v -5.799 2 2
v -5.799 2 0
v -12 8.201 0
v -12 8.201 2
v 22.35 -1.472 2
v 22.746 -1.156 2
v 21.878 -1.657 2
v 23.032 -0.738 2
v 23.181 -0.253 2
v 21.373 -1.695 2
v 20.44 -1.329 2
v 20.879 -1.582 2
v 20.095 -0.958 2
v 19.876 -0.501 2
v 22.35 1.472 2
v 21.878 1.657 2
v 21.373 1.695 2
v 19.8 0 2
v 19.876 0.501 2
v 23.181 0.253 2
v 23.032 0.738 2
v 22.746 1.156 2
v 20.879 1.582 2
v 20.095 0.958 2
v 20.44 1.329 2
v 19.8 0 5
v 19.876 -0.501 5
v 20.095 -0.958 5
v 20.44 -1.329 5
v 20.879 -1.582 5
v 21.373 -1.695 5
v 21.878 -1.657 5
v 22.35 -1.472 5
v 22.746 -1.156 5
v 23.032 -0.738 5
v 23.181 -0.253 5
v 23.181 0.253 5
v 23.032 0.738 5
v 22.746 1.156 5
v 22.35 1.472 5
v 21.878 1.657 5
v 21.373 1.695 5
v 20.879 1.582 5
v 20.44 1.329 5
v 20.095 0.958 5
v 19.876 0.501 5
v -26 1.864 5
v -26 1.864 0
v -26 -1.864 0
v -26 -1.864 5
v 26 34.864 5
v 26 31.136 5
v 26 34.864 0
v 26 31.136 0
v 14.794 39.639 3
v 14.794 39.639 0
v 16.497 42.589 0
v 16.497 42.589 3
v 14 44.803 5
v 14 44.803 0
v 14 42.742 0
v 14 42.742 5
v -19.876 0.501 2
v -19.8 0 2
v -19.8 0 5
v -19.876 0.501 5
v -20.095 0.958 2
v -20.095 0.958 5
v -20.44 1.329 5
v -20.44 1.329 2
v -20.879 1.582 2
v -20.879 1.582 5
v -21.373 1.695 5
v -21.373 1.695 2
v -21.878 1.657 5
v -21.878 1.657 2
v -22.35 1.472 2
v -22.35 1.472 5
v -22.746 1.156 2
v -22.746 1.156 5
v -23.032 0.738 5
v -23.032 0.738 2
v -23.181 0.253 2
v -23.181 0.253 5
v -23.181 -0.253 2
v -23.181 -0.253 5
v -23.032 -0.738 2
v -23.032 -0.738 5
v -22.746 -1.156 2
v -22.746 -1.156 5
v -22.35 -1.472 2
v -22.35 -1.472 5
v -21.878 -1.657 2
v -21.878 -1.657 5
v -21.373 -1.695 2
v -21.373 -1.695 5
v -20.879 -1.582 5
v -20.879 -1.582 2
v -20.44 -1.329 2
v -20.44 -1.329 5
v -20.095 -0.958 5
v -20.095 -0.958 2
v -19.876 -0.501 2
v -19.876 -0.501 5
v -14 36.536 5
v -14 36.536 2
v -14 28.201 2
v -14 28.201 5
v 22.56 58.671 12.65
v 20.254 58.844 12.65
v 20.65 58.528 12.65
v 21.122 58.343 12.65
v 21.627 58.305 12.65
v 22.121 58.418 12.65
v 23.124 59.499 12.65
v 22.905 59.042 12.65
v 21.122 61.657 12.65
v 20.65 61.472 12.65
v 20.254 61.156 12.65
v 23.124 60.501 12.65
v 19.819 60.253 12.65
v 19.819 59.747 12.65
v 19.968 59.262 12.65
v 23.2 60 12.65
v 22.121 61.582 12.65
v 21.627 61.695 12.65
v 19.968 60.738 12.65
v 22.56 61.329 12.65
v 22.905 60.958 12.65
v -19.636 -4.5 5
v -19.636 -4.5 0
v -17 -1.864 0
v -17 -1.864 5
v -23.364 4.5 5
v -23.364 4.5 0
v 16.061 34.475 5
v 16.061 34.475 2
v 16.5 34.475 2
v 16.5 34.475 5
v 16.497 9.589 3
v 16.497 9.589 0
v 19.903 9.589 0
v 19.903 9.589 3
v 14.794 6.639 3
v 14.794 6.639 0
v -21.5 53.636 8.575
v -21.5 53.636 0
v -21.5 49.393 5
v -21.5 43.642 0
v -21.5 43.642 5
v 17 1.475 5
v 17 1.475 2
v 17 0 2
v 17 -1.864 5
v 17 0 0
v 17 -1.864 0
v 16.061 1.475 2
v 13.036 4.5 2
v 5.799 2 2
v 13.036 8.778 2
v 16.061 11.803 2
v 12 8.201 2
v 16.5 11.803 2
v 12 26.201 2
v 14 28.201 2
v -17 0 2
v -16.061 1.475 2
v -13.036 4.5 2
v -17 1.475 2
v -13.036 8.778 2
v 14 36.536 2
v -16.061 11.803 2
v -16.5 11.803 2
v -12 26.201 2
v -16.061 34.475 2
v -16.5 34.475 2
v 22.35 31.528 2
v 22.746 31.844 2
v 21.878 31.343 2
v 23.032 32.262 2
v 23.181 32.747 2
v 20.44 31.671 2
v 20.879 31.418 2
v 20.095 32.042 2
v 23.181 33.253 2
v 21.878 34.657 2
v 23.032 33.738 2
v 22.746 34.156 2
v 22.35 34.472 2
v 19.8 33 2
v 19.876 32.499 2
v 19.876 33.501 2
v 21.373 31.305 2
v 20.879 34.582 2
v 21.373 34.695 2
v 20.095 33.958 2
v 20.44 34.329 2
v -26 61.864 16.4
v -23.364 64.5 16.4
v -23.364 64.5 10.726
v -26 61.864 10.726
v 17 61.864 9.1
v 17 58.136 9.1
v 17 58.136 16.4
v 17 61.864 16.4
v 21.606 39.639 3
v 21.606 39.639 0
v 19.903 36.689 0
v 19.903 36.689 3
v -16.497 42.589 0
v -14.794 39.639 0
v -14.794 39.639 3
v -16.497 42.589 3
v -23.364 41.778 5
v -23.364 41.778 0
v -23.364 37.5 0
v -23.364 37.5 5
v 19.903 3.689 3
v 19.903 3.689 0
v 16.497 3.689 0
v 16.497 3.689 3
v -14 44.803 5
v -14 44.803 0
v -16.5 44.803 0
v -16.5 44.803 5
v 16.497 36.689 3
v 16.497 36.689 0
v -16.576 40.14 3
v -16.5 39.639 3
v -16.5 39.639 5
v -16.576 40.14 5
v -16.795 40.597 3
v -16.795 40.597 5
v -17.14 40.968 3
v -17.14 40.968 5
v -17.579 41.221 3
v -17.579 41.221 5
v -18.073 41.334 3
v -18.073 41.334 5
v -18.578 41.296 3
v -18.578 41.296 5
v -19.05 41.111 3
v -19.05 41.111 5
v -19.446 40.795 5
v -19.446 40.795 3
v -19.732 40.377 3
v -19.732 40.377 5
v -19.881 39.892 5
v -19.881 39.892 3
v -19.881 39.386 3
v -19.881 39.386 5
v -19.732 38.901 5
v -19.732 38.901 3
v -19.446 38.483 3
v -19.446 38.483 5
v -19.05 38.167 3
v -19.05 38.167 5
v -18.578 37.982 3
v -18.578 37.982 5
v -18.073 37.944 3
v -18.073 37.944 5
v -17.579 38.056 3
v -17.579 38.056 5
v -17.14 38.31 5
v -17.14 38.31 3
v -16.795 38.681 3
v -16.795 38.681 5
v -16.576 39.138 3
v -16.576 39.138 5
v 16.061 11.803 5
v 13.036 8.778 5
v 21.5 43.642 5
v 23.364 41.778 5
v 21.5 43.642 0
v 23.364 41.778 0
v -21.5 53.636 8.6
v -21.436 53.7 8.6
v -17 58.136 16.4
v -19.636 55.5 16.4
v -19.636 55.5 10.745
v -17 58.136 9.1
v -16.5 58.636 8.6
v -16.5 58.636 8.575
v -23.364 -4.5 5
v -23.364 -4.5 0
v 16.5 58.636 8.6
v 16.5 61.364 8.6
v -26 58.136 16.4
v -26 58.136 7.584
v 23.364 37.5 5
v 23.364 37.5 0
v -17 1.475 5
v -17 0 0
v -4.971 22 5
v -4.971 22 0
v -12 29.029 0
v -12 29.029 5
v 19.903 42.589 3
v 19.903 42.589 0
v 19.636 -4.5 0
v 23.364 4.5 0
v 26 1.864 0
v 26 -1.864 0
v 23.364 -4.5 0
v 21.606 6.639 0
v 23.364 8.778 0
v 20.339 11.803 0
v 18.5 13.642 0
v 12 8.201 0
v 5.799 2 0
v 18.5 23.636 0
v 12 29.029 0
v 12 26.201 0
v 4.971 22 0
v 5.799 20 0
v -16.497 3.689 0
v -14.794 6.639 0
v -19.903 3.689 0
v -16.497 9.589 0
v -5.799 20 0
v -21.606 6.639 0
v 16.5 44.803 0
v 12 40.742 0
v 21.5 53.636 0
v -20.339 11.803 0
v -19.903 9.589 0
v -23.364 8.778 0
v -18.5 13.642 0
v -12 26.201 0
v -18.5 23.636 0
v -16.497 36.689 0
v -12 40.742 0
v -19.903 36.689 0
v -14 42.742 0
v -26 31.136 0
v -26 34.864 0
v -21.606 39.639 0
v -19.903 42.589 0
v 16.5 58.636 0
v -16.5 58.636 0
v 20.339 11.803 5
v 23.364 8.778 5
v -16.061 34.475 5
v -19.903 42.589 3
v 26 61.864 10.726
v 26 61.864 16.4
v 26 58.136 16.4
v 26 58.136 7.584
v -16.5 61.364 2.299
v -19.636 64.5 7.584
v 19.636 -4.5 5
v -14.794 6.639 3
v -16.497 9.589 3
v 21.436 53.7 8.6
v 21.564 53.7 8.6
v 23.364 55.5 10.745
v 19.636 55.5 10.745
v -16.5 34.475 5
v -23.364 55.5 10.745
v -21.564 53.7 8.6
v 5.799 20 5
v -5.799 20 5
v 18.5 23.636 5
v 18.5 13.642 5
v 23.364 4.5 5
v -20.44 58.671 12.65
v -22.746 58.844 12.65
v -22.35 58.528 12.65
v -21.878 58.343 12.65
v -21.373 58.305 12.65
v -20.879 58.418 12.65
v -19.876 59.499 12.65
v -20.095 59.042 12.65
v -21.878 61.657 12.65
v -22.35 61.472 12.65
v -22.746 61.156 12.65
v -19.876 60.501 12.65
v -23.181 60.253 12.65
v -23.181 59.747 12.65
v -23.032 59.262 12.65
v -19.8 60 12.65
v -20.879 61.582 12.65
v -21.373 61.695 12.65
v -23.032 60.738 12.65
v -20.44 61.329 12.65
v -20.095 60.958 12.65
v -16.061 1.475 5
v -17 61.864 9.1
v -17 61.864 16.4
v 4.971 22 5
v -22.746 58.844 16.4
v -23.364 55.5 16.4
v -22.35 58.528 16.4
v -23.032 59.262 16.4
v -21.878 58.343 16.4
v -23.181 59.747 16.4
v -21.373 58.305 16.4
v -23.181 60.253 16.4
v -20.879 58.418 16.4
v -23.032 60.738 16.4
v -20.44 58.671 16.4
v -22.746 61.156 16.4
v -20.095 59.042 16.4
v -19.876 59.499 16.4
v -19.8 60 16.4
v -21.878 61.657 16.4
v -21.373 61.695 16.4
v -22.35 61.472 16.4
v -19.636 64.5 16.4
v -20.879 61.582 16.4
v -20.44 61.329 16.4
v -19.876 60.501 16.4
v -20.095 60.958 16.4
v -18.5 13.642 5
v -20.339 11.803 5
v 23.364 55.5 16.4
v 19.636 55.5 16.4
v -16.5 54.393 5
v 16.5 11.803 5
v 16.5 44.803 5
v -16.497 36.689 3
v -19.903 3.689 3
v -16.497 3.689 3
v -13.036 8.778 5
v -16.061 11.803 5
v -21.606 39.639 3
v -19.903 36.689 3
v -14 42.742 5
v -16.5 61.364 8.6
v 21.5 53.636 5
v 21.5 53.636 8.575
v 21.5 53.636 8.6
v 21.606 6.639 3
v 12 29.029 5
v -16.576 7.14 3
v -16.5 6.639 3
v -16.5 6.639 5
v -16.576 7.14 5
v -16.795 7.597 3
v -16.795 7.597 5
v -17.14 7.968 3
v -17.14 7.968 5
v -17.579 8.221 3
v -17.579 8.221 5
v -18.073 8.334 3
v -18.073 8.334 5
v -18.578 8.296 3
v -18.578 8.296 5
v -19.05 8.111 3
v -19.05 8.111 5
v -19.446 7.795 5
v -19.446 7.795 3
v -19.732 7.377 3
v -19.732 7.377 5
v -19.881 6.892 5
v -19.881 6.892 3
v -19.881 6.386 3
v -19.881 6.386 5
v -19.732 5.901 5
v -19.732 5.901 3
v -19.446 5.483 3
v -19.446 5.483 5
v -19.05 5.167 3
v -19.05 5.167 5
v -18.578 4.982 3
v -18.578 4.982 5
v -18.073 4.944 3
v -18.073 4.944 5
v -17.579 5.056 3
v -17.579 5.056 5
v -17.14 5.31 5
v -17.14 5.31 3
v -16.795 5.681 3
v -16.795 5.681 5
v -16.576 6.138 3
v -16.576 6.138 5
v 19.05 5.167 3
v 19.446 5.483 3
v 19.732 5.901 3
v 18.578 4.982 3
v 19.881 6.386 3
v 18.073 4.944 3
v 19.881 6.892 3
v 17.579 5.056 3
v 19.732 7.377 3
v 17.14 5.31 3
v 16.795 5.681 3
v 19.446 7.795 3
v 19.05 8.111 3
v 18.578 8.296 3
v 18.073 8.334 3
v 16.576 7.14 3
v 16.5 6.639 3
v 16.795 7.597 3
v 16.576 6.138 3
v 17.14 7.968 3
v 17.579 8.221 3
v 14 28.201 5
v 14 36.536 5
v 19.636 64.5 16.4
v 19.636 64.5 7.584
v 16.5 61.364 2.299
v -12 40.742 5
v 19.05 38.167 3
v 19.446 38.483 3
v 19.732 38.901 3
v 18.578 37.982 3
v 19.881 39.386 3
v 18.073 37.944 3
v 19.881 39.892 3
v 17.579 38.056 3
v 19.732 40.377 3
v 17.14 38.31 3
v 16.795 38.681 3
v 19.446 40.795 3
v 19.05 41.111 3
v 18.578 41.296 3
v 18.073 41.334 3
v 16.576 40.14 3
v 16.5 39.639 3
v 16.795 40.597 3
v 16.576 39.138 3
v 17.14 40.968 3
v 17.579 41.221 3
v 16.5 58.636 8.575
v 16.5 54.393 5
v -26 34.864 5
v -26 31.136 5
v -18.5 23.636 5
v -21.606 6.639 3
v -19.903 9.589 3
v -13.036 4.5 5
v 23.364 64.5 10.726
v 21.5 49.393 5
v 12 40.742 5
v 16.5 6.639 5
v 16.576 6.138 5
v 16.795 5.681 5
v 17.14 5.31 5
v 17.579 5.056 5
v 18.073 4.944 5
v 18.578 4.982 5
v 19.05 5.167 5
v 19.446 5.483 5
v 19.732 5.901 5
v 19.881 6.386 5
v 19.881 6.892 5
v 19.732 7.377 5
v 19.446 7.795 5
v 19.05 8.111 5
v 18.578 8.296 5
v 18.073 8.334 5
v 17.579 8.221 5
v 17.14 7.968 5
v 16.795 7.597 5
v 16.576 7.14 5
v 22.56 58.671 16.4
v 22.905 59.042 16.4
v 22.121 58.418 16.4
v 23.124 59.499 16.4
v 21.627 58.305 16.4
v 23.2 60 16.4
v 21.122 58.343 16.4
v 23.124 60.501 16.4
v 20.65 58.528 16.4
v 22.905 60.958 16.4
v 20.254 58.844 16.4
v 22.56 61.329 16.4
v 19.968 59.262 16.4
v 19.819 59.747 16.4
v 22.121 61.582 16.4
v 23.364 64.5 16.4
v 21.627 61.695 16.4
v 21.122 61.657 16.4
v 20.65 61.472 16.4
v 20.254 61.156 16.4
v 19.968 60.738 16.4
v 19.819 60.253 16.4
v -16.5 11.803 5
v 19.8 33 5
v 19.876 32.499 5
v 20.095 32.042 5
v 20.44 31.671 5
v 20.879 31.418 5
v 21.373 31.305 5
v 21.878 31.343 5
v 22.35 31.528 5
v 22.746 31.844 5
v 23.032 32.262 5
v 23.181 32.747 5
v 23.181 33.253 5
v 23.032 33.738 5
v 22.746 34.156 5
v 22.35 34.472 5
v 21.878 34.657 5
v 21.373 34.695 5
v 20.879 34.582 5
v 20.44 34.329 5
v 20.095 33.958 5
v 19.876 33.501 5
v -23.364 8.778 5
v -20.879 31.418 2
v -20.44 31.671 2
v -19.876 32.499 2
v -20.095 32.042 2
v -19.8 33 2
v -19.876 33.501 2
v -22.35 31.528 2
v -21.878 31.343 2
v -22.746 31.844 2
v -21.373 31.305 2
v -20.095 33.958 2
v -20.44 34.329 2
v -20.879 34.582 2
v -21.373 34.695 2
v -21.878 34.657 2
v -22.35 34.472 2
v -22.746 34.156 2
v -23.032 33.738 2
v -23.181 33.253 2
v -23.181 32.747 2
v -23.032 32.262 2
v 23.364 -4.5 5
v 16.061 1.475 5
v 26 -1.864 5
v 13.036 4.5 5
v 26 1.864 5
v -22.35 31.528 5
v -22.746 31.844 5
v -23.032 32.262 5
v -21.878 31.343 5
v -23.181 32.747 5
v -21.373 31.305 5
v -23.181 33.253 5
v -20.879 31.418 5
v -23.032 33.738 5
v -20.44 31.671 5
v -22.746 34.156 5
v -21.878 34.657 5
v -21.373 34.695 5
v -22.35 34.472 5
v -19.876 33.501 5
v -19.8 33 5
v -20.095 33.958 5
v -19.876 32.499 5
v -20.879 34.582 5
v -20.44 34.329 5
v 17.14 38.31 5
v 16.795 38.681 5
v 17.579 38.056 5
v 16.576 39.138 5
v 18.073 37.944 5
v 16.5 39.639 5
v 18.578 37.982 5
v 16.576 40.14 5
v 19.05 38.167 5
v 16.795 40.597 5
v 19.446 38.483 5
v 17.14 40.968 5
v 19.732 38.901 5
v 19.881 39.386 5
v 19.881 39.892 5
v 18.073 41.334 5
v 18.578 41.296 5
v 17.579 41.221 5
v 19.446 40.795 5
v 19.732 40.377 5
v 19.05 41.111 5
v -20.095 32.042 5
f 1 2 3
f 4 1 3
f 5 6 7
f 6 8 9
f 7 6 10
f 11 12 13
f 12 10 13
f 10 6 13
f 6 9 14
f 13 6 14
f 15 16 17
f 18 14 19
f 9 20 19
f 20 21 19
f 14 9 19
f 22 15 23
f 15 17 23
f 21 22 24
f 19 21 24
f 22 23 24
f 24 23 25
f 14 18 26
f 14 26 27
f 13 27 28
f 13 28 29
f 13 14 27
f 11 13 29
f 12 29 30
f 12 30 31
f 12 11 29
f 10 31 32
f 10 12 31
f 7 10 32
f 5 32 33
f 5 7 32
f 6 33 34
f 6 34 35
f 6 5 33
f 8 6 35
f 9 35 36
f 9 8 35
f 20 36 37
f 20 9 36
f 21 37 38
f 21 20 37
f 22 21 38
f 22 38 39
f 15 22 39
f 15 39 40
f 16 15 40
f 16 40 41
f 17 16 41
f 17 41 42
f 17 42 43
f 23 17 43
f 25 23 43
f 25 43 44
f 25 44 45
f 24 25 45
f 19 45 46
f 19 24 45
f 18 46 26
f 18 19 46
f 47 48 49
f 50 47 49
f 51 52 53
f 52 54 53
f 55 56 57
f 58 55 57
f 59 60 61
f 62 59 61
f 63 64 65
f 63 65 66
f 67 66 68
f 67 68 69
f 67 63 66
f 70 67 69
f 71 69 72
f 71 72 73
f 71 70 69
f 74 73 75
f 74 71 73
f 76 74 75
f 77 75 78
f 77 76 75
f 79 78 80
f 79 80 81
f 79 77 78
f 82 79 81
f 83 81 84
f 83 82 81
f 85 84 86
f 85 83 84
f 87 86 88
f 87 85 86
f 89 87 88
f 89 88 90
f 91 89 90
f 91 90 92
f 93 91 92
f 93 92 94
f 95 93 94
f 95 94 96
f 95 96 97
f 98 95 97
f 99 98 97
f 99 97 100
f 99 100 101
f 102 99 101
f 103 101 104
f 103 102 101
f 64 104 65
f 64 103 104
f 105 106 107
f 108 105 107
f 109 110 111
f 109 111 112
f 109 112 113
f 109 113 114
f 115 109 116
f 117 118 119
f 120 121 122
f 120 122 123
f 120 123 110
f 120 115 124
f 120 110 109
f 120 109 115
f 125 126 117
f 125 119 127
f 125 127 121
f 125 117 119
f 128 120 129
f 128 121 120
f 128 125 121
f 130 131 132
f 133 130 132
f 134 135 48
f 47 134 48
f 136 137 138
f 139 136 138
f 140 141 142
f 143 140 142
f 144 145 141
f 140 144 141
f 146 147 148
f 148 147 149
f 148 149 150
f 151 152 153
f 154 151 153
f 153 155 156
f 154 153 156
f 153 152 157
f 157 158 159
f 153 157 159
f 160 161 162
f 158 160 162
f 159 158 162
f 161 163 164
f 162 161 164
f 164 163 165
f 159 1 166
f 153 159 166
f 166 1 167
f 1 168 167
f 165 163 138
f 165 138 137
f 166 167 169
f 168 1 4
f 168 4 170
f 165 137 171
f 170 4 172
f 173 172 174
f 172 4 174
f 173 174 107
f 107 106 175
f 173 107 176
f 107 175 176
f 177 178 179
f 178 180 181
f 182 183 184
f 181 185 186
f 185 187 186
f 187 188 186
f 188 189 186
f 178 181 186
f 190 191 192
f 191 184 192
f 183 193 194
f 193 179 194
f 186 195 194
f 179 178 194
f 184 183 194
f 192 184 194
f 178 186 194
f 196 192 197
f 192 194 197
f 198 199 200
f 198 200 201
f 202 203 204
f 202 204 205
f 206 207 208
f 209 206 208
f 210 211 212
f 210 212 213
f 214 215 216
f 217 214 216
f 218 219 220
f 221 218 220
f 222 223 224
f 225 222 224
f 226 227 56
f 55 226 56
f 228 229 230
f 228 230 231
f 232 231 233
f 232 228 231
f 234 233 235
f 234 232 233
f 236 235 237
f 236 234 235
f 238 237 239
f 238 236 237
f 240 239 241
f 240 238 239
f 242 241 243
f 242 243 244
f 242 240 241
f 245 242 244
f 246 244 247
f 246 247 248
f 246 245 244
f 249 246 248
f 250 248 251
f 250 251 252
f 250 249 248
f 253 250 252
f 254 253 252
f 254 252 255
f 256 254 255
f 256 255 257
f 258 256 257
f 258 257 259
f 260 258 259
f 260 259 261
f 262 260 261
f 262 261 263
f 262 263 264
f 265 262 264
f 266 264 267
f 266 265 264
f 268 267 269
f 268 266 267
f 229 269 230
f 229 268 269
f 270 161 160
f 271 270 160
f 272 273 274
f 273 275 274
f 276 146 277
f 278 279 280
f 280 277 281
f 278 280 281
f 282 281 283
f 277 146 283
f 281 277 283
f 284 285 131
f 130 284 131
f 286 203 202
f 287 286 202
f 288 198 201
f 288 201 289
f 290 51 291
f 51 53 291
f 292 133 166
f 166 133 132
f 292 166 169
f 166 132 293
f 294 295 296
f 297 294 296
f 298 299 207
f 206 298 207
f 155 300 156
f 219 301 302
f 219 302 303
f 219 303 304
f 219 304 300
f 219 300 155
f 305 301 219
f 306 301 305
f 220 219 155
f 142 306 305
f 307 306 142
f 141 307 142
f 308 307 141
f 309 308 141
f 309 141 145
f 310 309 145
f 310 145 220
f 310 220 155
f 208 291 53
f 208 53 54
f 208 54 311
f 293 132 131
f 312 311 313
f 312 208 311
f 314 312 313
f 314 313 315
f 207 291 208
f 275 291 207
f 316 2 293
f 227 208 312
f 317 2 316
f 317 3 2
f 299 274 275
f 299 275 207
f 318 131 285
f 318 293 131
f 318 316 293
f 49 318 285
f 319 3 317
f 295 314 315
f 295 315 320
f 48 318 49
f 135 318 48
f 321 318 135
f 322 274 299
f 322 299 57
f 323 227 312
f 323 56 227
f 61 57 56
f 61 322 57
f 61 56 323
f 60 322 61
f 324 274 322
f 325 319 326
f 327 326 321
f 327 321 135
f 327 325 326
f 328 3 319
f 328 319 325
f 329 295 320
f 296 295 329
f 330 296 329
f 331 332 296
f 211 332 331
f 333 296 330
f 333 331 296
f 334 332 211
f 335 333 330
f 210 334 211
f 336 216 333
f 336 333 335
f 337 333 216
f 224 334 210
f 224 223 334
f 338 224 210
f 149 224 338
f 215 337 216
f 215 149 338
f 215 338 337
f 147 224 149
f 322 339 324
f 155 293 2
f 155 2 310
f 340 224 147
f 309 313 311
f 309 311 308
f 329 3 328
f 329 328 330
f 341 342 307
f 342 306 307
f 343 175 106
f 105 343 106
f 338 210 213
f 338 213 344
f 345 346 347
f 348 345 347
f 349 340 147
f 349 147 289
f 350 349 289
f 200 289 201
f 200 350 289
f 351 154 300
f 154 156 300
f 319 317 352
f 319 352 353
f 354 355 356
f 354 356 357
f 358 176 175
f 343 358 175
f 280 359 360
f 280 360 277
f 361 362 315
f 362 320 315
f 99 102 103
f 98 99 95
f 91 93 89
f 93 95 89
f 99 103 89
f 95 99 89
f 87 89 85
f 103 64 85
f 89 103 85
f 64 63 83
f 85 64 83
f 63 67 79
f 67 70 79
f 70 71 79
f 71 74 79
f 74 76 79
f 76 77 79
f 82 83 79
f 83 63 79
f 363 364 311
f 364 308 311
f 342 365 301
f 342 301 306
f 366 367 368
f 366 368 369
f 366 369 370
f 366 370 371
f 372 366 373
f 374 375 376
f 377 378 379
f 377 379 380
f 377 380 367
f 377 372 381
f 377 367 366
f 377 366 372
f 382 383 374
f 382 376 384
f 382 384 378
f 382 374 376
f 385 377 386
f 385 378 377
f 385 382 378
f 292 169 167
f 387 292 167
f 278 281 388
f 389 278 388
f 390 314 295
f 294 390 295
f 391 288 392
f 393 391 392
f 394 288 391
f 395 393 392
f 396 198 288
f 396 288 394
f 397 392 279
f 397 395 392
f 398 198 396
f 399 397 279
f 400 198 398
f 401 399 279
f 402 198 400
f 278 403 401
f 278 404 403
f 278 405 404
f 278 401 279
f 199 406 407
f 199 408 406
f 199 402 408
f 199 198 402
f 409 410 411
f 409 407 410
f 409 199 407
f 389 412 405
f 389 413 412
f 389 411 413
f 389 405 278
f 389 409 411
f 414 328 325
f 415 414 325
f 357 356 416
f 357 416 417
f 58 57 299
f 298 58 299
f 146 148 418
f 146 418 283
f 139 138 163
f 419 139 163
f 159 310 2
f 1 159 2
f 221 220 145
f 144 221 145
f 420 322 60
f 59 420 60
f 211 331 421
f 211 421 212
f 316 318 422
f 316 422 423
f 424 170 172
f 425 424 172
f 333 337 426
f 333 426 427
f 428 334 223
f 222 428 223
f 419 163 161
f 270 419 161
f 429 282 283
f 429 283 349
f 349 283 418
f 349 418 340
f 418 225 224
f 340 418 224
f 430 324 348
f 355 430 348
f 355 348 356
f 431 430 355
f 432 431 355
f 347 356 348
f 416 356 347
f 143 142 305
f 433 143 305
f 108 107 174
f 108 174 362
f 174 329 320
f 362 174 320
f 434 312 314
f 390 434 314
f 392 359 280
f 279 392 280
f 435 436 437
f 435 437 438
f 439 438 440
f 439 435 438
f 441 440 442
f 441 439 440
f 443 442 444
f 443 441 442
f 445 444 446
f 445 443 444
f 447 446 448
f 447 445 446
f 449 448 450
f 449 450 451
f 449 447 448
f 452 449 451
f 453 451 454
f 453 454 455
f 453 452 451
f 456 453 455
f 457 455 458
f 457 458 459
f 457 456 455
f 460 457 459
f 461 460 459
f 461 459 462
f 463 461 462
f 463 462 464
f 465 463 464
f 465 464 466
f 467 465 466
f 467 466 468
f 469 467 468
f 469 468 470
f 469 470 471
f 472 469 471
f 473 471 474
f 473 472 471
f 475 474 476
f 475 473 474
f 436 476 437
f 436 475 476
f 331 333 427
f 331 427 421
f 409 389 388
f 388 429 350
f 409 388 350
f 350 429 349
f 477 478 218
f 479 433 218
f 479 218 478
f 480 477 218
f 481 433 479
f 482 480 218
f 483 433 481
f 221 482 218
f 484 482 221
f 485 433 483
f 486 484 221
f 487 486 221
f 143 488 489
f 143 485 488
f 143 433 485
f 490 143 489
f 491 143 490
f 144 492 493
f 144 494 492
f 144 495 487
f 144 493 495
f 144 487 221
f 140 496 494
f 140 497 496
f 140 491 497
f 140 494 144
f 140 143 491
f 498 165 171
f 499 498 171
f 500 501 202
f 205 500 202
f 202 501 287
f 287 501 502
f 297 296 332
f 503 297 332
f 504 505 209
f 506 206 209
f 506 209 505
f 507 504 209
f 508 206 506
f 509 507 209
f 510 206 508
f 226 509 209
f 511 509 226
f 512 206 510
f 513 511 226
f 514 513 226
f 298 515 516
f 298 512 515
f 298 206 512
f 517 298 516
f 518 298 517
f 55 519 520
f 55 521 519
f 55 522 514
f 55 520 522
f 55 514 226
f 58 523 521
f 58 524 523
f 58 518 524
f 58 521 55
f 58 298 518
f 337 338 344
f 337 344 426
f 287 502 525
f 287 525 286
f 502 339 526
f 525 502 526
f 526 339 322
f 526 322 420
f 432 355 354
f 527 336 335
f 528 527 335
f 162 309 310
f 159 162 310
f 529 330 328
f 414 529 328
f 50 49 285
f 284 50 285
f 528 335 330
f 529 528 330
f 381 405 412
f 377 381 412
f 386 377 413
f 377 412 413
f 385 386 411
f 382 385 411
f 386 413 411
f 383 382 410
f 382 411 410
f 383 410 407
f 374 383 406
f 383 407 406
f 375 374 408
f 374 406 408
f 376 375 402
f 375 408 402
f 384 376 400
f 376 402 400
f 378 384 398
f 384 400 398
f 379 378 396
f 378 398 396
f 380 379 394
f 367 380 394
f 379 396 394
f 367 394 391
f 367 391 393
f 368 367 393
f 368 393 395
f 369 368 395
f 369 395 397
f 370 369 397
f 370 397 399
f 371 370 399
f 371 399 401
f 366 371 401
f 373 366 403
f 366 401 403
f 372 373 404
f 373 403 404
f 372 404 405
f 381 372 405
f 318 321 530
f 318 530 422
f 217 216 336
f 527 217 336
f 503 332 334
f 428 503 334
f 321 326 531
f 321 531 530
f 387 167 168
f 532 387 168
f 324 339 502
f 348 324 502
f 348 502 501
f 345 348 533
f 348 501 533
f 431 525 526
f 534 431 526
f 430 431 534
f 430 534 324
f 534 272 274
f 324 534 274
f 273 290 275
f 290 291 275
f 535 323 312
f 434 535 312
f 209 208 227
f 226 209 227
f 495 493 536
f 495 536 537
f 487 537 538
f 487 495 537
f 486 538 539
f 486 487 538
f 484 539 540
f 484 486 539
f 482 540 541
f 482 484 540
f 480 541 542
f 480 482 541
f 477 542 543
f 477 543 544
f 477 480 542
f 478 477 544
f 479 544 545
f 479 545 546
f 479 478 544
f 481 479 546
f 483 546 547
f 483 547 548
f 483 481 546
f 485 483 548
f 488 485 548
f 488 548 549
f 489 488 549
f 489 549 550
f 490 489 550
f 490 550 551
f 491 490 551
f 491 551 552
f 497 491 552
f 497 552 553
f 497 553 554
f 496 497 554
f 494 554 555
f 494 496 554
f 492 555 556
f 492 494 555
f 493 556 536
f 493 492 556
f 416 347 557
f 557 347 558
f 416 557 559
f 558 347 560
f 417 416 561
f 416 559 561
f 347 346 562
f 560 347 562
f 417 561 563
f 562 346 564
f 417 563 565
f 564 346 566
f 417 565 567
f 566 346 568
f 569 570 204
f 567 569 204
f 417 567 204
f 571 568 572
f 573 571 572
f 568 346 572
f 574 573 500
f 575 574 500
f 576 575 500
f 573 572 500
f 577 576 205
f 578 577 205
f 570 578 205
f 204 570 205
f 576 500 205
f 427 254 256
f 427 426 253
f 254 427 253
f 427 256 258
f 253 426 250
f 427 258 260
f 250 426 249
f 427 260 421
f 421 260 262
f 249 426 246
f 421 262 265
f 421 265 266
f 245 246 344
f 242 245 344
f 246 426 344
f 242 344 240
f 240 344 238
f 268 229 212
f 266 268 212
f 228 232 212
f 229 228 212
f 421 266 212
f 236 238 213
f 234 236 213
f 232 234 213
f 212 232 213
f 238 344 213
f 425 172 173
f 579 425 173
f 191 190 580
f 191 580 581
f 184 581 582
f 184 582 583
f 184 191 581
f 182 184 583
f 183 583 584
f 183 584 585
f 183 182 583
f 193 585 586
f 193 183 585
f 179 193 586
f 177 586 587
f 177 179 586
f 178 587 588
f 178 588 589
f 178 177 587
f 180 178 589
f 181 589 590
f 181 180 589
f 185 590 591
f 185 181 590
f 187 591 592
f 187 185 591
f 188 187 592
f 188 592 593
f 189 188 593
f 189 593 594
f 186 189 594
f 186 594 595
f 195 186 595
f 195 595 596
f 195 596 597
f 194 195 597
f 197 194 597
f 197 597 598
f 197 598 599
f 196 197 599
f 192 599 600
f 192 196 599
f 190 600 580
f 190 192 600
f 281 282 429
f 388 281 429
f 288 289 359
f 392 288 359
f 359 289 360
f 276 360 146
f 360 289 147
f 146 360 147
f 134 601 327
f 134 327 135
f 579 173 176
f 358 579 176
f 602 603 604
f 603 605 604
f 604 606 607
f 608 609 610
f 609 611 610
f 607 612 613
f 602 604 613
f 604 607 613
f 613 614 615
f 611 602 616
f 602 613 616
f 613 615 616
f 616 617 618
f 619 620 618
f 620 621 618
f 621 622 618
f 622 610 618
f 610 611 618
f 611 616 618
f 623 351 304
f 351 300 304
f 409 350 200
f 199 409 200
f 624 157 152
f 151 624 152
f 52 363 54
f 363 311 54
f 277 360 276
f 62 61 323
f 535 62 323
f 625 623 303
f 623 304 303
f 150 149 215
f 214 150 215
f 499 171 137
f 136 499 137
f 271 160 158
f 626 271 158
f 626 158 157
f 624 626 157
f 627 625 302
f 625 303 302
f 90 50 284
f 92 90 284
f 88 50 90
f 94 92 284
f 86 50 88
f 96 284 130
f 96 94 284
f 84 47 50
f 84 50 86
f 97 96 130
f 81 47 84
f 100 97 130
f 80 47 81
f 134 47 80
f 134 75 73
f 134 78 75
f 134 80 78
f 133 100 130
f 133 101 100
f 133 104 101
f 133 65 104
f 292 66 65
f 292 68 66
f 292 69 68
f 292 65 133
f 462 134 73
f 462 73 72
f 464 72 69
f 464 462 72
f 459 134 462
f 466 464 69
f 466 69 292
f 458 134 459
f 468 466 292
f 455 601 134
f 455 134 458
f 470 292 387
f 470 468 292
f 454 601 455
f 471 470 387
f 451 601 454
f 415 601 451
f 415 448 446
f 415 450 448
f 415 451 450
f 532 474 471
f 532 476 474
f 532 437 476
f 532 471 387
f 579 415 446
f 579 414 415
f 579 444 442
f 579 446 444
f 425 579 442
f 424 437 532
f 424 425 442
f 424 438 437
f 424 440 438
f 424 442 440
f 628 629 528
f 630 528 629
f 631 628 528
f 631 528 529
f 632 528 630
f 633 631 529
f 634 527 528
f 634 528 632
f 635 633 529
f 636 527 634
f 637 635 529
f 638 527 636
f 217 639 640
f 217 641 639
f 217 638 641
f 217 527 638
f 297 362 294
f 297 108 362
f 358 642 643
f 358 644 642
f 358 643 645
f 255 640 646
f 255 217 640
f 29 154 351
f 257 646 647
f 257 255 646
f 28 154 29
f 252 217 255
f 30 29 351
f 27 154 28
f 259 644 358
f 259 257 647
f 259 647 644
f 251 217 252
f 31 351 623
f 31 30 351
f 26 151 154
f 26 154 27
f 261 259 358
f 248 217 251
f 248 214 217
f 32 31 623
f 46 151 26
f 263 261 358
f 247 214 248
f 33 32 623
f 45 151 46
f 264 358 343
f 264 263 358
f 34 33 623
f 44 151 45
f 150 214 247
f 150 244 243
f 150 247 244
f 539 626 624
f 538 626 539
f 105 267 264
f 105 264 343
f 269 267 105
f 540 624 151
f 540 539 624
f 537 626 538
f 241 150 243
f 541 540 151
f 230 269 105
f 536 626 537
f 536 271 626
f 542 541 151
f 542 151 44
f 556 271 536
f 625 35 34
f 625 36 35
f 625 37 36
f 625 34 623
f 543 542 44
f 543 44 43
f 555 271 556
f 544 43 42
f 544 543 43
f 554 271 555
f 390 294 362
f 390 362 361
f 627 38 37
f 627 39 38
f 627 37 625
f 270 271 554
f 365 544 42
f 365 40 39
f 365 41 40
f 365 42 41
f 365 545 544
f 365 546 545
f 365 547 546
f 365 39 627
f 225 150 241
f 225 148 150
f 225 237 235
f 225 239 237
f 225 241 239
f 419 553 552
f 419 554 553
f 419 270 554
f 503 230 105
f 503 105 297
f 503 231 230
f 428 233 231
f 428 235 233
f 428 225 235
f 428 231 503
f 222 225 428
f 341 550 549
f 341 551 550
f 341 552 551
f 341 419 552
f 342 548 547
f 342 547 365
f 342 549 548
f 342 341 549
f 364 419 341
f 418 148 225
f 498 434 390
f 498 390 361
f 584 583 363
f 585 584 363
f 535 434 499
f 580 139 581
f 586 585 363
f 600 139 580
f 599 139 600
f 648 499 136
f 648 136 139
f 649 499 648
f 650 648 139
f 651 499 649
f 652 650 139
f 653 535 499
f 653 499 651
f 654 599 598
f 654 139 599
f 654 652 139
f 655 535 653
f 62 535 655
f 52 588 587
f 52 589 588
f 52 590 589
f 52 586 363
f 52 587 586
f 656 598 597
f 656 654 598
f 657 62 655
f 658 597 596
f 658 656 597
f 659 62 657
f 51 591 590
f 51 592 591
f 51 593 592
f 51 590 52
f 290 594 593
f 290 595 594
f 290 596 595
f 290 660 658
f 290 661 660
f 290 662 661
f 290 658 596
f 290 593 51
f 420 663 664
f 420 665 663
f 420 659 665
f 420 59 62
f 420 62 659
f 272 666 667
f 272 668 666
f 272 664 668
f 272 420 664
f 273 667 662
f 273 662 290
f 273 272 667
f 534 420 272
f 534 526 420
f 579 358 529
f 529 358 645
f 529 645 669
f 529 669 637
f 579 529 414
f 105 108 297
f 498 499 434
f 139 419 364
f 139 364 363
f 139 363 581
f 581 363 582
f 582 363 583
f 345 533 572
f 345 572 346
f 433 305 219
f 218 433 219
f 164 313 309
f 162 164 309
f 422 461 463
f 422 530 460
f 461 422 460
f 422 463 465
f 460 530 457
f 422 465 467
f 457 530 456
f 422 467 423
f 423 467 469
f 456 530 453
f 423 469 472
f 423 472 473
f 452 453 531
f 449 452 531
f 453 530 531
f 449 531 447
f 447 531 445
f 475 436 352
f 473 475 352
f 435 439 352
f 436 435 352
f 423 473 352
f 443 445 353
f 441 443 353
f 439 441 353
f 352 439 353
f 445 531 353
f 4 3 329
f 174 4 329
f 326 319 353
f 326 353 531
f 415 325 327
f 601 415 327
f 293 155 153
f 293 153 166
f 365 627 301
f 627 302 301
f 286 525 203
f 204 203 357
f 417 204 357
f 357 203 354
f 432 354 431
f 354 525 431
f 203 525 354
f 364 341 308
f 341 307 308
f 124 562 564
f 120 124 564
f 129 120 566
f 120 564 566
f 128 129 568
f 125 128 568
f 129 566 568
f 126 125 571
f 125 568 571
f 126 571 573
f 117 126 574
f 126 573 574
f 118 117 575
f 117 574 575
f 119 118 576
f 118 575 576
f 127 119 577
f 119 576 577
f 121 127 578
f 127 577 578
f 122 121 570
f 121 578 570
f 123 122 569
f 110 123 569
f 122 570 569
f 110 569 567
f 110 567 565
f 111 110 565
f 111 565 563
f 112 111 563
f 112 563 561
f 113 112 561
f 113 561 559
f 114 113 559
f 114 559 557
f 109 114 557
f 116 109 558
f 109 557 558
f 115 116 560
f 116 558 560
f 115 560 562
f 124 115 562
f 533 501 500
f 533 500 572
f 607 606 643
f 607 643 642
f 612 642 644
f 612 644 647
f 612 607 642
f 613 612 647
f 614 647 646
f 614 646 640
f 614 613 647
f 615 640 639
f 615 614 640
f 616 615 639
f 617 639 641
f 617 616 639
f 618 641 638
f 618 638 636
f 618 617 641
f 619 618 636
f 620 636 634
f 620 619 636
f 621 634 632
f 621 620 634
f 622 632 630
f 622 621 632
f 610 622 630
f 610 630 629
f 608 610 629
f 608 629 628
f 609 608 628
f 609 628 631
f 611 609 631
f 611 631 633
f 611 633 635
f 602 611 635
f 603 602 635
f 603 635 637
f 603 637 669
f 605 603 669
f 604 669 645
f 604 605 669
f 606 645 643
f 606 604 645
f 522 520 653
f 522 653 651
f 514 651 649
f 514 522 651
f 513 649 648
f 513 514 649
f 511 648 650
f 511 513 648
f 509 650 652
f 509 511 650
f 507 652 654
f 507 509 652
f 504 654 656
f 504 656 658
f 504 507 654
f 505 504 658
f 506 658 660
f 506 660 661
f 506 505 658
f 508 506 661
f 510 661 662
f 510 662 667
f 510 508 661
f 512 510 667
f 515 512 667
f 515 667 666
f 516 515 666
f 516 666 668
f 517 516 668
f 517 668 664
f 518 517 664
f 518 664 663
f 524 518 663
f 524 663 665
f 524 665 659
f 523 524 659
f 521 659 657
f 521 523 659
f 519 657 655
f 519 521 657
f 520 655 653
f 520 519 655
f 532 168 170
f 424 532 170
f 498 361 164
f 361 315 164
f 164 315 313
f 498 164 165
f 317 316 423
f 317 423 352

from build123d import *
from OCP.BRepFilletAPI import BRepFilletAPI_MakeChamfer

# Parameters (mm, degrees)
SKETCH5_R           = 1.7
BOSS_EXTRUDE1_DEPTH = 2
SKETCH9_R           = 1.7
BOSS_EXTRUDE3_DEPTH = 3
BOSS_EXTRUDE4_DEPTH = 3.6
BOSS_EXTRUDE5_DEPTH = 7.8
TOP_ANGLE_1_DEPTH   = 25
TOP_ANGLE_2_DEPTH   = 25
CHAMFER1_SIZE       = 3
CHAMFER1_SIZE_2     = 3.575260778
CHAMFER2_SIZE       = 1.8
CHAMFER2_SIZE2      = 2.145156467
SKETCH19_R          = 1.7
CUT_EXTRUDE1_DEPTH  = 3.75
M3_HEAD_HOLES_DEPTH = 3
CHAMFER3_SIZE       = 0.5


# Some blends are built 0.0001 mm under size
with BuildPart() as part:
    # Sketch5 → Boss-Extrude1 (new body)
    with BuildSketch(Plane.XY):
        Polygon((16.5, 44.802943725), (16.5, 45.24192642), (16.5, 61.363961031), (17, 61.863961031), (19.636038969, 64.5), (23.363961031, 64.5), (26, 61.863961031), (26, 58.136038969), (23.363961031, 55.5), (21.5, 53.636038969), (21.5, 43.64192642), (23.363961031, 41.777965389), (23.363961031, 37.5), (26, 34.863961031), (26, 31.136038969), (23.363961031, 28.5), (18.5, 23.636038969), (18.5, 13.64192642), (20.338982694, 11.802943725), (23.363961031, 8.777965389), (23.363961031, 4.5), (26, 1.863961031), (26, -1.863961031), (23.363961031, -4.5), (19.636038969, -4.5), (17, -1.863961031), (17, 0), (-17, 0), (-17, -1.863961031), (-19.636038969, -4.5), (-23.363961031, -4.5), (-26, -1.863961031), (-26, 1.863961031), (-23.363961031, 4.5), (-23.363961031, 8.777965389), (-20.338982694, 11.802943725), (-18.5, 13.64192642), (-18.5, 23.636038969), (-23.363961031, 28.5), (-26, 31.136038969), (-26, 34.863961031), (-23.363961031, 37.5), (-23.363961031, 41.777965389), (-21.5, 43.64192642), (-21.5, 53.636038969), (-23.363961031, 55.5), (-26, 58.136038969), (-26, 61.863961031), (-23.363961031, 64.5), (-19.636038969, 64.5), (-17, 61.863961031), (-16.5, 61.363961031), (-16.5, 60), (-16.5, 44.802943725), (-16.061017306, 44.802943725), (-14, 44.802943725), (-14, 42.74192642), (-13.036038969, 41.777965389), (-12, 40.74192642), (-12, 29.029437252), (-4.970562748, 22), (4.970562748, 22), (12, 29.029437252), (12, 40.74192642), (13.036038969, 41.777965389), (14, 42.74192642), (14, 44.802943725), (16.061017306, 44.802943725), align=None)
        with Locations((-18.2, 6.638982694)):
            Circle(SKETCH5_R, mode=Mode.SUBTRACT)
        with Locations((-18.2, 39.638982694)):
            Circle(SKETCH5_R, mode=Mode.SUBTRACT)
        with Locations(Location((18.2, 39.638982694, 0), (0, 0, 180))):
            Circle(SKETCH5_R, mode=Mode.SUBTRACT)
        with Locations(Location((18.2, 6.638982694, 0), (0, 0, 180))):
            Circle(SKETCH5_R, mode=Mode.SUBTRACT)
        Polygon((5.798989873, 2), (-5.798989873, 2), (-12, 8.201010127), (-12, 26.201010127), (-5.798989873, 20), (5.798989873, 20), (12, 26.201010127), (12, 8.201010127), align=None, mode=Mode.SUBTRACT)
    extrude(amount=BOSS_EXTRUDE1_DEPTH)

    # Sketch9 → Boss-Extrude3 (add)
    with BuildSketch(Plane.XY.offset(2)):
        Polygon((-19.636038969, -4.5), (-17, -1.863961031), (-17, 1.475021664), (-16.061017306, 1.475021664), (-13.036038969, 4.5), (-13.036038969, 8.777965389), (-16.061017306, 11.802943725), (-16.5, 11.802943725), (-16.5, 34.363961031), (-16.5, 34.475021664), (-16.061017306, 34.475021664), (-14, 36.536038969), (-14, 28.201010127), (-12, 26.201010127), (-5.798989873, 20), (5.798989873, 20), (12, 26.201010127), (14, 28.201010127), (14, 36.536038969), (16.061017306, 34.475021664), (16.5, 34.475021664), (16.5, 34.363961031), (16.5, 11.802943725), (16.061017306, 11.802943725), (13.036038969, 8.777965389), (13.036038969, 4.5), (16.061017306, 1.475021664), (17, 1.475021664), (17, -1.863961031), (19.636038969, -4.5), (23.363961031, -4.5), (26, -1.863961031), (26, 1.863961031), (23.363961031, 4.5), (23.363961031, 8.777965389), (20.338982694, 11.802943725), (18.5, 13.64192642), (18.5, 23.636038969), (23.363961031, 28.5), (26, 31.136038969), (26, 34.863961031), (23.363961031, 37.5), (23.363961031, 41.777965389), (21.5, 43.64192642), (21.5, 53.636038969), (23.363961031, 55.5), (26, 58.136038969), (26, 61.863961031), (23.363961031, 64.5), (19.636038969, 64.5), (17, 61.863961031), (16.5, 61.363961031), (16.5, 45.24192642), (16.5, 44.802943725), (16.061017306, 44.802943725), (14, 44.802943725), (14, 42.74192642), (13.036038969, 41.777965389), (12, 40.74192642), (12, 29.029437252), (4.970562748, 22), (-4.970562748, 22), (-12, 29.029437252), (-12, 40.74192642), (-13.036038969, 41.777965389), (-14, 42.74192642), (-14, 44.802943725), (-16.061017306, 44.802943725), (-16.5, 44.802943725), (-16.5, 60), (-16.5, 61.363961031), (-17, 61.863961031), (-19.636038969, 64.5), (-23.363961031, 64.5), (-26, 61.863961031), (-26, 58.136038969), (-23.363961031, 55.5), (-21.5, 53.636038969), (-21.5, 43.64192642), (-23.363961031, 41.777965389), (-23.363961031, 37.5), (-26, 34.863961031), (-26, 31.136038969), (-23.363961031, 28.5), (-18.5, 23.636038969), (-18.5, 13.64192642), (-20.338982694, 11.802943725), (-23.363961031, 8.777965389), (-23.363961031, 4.5), (-26, 1.863961031), (-26, -1.863961031), (-23.363961031, -4.5), align=None)
        with Locations((-21.5, 33)):
            Circle(SKETCH9_R, mode=Mode.SUBTRACT)
        with Locations((-18.2, 39.638982694)):
            Circle(SKETCH9_R, mode=Mode.SUBTRACT)
        with Locations((-21.5, 0)):
            Circle(SKETCH9_R, mode=Mode.SUBTRACT)
        with Locations((-18.2, 6.638982694)):
            Circle(SKETCH9_R, mode=Mode.SUBTRACT)
        with Locations(Location((18.2, 6.638982694, 0), (0, 0, 180))):
            Circle(SKETCH9_R, mode=Mode.SUBTRACT)
        with Locations(Location((21.5, 0, 0), (0, 0, 180))):
            Circle(SKETCH9_R, mode=Mode.SUBTRACT)
        with Locations(Location((18.2, 39.638982694, 0), (0, 0, 180))):
            Circle(SKETCH9_R, mode=Mode.SUBTRACT)
        with Locations(Location((21.5, 33, 0), (0, 0, 180))):
            Circle(SKETCH9_R, mode=Mode.SUBTRACT)
    extrude(amount=BOSS_EXTRUDE3_DEPTH)

    # Sketch10 → Boss-Extrude4 (add)
    with BuildSketch(Plane.XY.offset(5)):
        Polygon((17, 58.136038969), (16.5, 58.636038969), (16.5, 61.363961031), (17, 61.863961031), (19.636038969, 64.5), (23.363961031, 64.5), (26, 61.863961031), (26, 58.136038969), (23.363961031, 55.5), (21.5, 53.636038969), (19.636038969, 55.5), align=None)
        Polygon((-17, 61.863961031), (-19.636038969, 64.5), (-23.363961031, 64.5), (-26, 61.863961031), (-26, 58.136038969), (-23.363961031, 55.5), (-21.5, 53.636038969), (-19.636038969, 55.5), (-17, 58.136038969), (-16.5, 58.636038969), (-16.5, 61.363961031), align=None)
    extrude(amount=BOSS_EXTRUDE4_DEPTH)

    # Sketch20 → Boss-Extrude5 (add)
    with BuildSketch(Plane.XY.offset(8.6)):
        Polygon((-17, 58.136038969), (-17, 61.863961031), (-19.636038969, 64.5), (-23.363961031, 64.5), (-26, 61.863961031), (-26, 58.136038969), (-23.363961031, 55.5), (-19.636038969, 55.5), align=None)
        Polygon((17, 61.863961031), (19.636038969, 64.5), (23.363961031, 64.5), (26, 61.863961031), (26, 58.136038969), (23.363961031, 55.5), (19.636038969, 55.5), (17, 58.136038969), align=None)
    extrude(amount=BOSS_EXTRUDE5_DEPTH)

    # Sketch15 → Top Angle 1 (cut, symmetric)
    with BuildSketch(Plane(origin=(19.25, 19.25, 0), x_dir=(0, 0, -1), z_dir=(0.7071067811865485, 0.7071067811865467, 0))):
        Polygon((0, 53.129202667), (-15.320888862, 65.98495486), (-8.893012766, 73.645399292), (6.427876097, 60.789647098), align=None)
    extrude(amount=TOP_ANGLE_1_DEPTH, both=True, mode=Mode.SUBTRACT)

    # Sketch16 → Top Angle 2 (cut, symmetric)
    with BuildSketch(Plane(origin=(-19.25, 19.25, 0), x_dir=(0.7071067811865475, 0.7071067811865477, 0), z_dir=(-0.7071067811865477, 0.7071067811865475, 0))):
        Polygon((53.129202667, 0), (65.98495486, -15.320888862), (73.645399292, -8.893012766), (60.789647098, 6.427876097), align=None)
    extrude(amount=TOP_ANGLE_2_DEPTH, both=True, mode=Mode.SUBTRACT)

    # Chamfer1
    # the kernel refuses this chamfer: 3.575260778, 3 mm, written as the material it adds along each edge
    with BuildSketch(Plane(origin=(-28.015917535, 47.120121434, 5), x_dir=(0.7066633444206492, -0.7066633444206532, -0.03540953691366292), z_dir=(0.7071067811865496, 0.7071067811865456, 0))) as chamfer1_piece_1_section:
        Polygon((CHAMFER1_SIZE * 0.999372885712, -CHAMFER1_SIZE * 0.0354095369137), (-CHAMFER1_SIZE_2 * 0.0354095369115, -CHAMFER1_SIZE_2 * 0.999372885651), (0, 0), align=None)
    chamfer1_piece_1 = extrude(amount=25.500865711, mode=Mode.PRIVATE)
    chamfer1_piece_1 = split(chamfer1_piece_1, bisect_by=Plane(origin=(-21.5, 51.974230038, 5.812222145), z_dir=(1, 0, 0)), keep=Keep.TOP, mode=Mode.PRIVATE)
    chamfer1_piece_1 = split(chamfer1_piece_1, bisect_by=Plane(origin=(-20.392127379, 52.528166349, 5.812222145), z_dir=(-0.7071067811865449, -0.7071067811865502, 0)), keep=Keep.TOP, mode=Mode.PRIVATE)
    add(chamfer1_piece_1)
    with BuildSketch(Plane(origin=(-21.5, 53.636038969, 5), x_dir=(0.7066633444206492, -0.7066633444206532, -0.03540953691366292), z_dir=(0.7071067811865496, 0.7071067811865456, 0))) as chamfer1_piece_2_section:
        Polygon((CHAMFER1_SIZE * 0.999372885712, -CHAMFER1_SIZE * 0.0354095369137), (-CHAMFER1_SIZE_2 * 0.0354095369115, -CHAMFER1_SIZE_2 * 0.999372885651), (0, 0), align=None)
    chamfer1_piece_2 = extrude(amount=16.285966762, mode=Mode.PRIVATE)
    chamfer1_piece_2 = split(chamfer1_piece_2, bisect_by=Plane(origin=(-21.5, 55.195385709, 6.244922793), z_dir=(1, 0, 0)), keep=Keep.TOP, mode=Mode.PRIVATE)
    chamfer1_piece_2 = split(chamfer1_piece_2, bisect_by=Plane(origin=(-16.5, 55.195385709, 6.244922793), z_dir=(-1, 0, 0)), keep=Keep.TOP, mode=Mode.PRIVATE)
    add(chamfer1_piece_2)
    with BuildSketch(Plane(origin=(9.984082465, 65.151956505, 5), x_dir=(0.017634763768199533, 0.01763476376819963, 0.9996889667359942), z_dir=(0.7071067811865496, -0.7071067811865456, 0))) as chamfer1_piece_3_section:
        Polygon((CHAMFER1_SIZE_2 * 0.999688966675, CHAMFER1_SIZE_2 * 0.0249393220887), (-CHAMFER1_SIZE * 0.0249393220902, CHAMFER1_SIZE * 0.999688966736), (0, 0), align=None)
    chamfer1_piece_3 = extrude(amount=16.285966762, mode=Mode.PRIVATE)
    chamfer1_piece_3 = split(chamfer1_piece_3, bisect_by=Plane(origin=(16.5, 55.195385709, 6.244922793), z_dir=(1, 0, 0)), keep=Keep.TOP, mode=Mode.PRIVATE)
    chamfer1_piece_3 = split(chamfer1_piece_3, bisect_by=Plane(origin=(21.5, 55.195385709, 6.244922793), z_dir=(-1, 0, 0)), keep=Keep.TOP, mode=Mode.PRIVATE)
    add(chamfer1_piece_3)
    with BuildSketch(Plane(origin=(9.984082465, 65.151956505, 5), x_dir=(0.017634763768199533, 0.01763476376819963, 0.9996889667359942), z_dir=(0.7071067811865496, -0.7071067811865456, 0))) as chamfer1_piece_4_section:
        Polygon((CHAMFER1_SIZE_2 * 0.999688966675, CHAMFER1_SIZE_2 * 0.0249393220887), (-CHAMFER1_SIZE * 0.0249393220902, CHAMFER1_SIZE * 0.999688966736), (0, 0), align=None)
    chamfer1_piece_4 = extrude(amount=25.500865711, mode=Mode.PRIVATE)
    chamfer1_piece_4 = split(chamfer1_piece_4, bisect_by=Plane(origin=(20.392127379, 52.528166349, 5.812222145), z_dir=(0.707106781186548, -0.707106781186547, 0)), keep=Keep.TOP, mode=Mode.PRIVATE)
    chamfer1_piece_4 = split(chamfer1_piece_4, bisect_by=Plane(origin=(21.5, 51.974230038, 5.812222145), z_dir=(-1, 0, 0)), keep=Keep.TOP, mode=Mode.PRIVATE)
    add(chamfer1_piece_4)

    # Chamfer2: one chamfer whose edges measure the first distance from different faces: ONE call of the kernel's chamfer builder (chamfer() names one face for all edges)
    chamfer2_edges_1 = [part.edges().sort_by_distance(p)[0] for p in [
        (21.5, 55.5, 8.6),
    ]]
    chamfer2_side_1 = [part.faces().sort_by_distance(p)[0] for p in [
        (21.5, 54.878679656, 8.6),
    ]]
    chamfer2_edges_2 = [part.edges().sort_by_distance(p)[0] for p in [
        (-21.5, 55.5, 8.6),
    ]]
    chamfer2_side_2 = [part.faces().sort_by_distance(p)[0] for p in [
        (-21.5, 54.878679656, 8.6),
    ]]
    chamfer2 = BRepFilletAPI_MakeChamfer(part.part.solid().wrapped)
    for e in chamfer2_edges_1:
        chamfer2.Add(CHAMFER2_SIZE, CHAMFER2_SIZE2, e.wrapped, chamfer2_side_1[0].wrapped)  # the first distance lies on this face
    for e in chamfer2_edges_2:
        chamfer2.Add(CHAMFER2_SIZE, CHAMFER2_SIZE2, e.wrapped, chamfer2_side_2[0].wrapped)  # the first distance lies on this face
    add(Compound.cast(chamfer2.Shape()), mode=Mode.REPLACE)

    # Sketch19 → Cut-Extrude1 (cut)
    with BuildSketch(Plane.XY.offset(16.4)):
        with Locations((-21.5, 60)):
            Circle(SKETCH19_R)
        with Locations((21.5, 60)):
            Circle(SKETCH19_R)
    extrude(amount=-CUT_EXTRUDE1_DEPTH, mode=Mode.SUBTRACT)

    # Sketch18 → M3 Head Holes (cut)
    with BuildSketch(Plane(origin=(0, 0, 0), x_dir=(-1, 0, 0), z_dir=(0, 0, -1))):
        Polygon((16.496816706, 42.588982694), (19.903183294, 42.588982694), (21.606366588, 39.638982694), (19.903183294, 36.688982694), (16.496816706, 36.688982694), (14.793633412, 39.638982694), align=None)
        Polygon((19.903183294, 9.588982694), (21.606366588, 6.638982694), (19.903183294, 3.688982694), (16.496816706, 3.688982694), (14.793633412, 6.638982694), (16.496816706, 9.588982694), align=None)
        Polygon((-21.606366588, 6.638982694), (-19.903183294, 3.688982694), (-16.496816706, 3.688982694), (-14.793633412, 6.638982694), (-16.496816706, 9.588982694), (-19.903183294, 9.588982694), align=None)
        Polygon((-14.793633412, 39.638982694), (-16.496816706, 42.588982694), (-19.903183294, 42.588982694), (-21.606366588, 39.638982694), (-19.903183294, 36.688982694), (-16.496816706, 36.688982694), align=None)
    extrude(amount=-M3_HEAD_HOLES_DEPTH, mode=Mode.SUBTRACT)

    # Chamfer3
    chamfer3_edges = [part.edges().sort_by_distance(p)[0] for p in [
        (17, 60, 8.6),
        (-17, 60, 8.6),
    ]]
    chamfer(chamfer3_edges, length=CHAMFER3_SIZE - 0.0001)  # a hair under: the kernel refuses the full size


solid = part.part
